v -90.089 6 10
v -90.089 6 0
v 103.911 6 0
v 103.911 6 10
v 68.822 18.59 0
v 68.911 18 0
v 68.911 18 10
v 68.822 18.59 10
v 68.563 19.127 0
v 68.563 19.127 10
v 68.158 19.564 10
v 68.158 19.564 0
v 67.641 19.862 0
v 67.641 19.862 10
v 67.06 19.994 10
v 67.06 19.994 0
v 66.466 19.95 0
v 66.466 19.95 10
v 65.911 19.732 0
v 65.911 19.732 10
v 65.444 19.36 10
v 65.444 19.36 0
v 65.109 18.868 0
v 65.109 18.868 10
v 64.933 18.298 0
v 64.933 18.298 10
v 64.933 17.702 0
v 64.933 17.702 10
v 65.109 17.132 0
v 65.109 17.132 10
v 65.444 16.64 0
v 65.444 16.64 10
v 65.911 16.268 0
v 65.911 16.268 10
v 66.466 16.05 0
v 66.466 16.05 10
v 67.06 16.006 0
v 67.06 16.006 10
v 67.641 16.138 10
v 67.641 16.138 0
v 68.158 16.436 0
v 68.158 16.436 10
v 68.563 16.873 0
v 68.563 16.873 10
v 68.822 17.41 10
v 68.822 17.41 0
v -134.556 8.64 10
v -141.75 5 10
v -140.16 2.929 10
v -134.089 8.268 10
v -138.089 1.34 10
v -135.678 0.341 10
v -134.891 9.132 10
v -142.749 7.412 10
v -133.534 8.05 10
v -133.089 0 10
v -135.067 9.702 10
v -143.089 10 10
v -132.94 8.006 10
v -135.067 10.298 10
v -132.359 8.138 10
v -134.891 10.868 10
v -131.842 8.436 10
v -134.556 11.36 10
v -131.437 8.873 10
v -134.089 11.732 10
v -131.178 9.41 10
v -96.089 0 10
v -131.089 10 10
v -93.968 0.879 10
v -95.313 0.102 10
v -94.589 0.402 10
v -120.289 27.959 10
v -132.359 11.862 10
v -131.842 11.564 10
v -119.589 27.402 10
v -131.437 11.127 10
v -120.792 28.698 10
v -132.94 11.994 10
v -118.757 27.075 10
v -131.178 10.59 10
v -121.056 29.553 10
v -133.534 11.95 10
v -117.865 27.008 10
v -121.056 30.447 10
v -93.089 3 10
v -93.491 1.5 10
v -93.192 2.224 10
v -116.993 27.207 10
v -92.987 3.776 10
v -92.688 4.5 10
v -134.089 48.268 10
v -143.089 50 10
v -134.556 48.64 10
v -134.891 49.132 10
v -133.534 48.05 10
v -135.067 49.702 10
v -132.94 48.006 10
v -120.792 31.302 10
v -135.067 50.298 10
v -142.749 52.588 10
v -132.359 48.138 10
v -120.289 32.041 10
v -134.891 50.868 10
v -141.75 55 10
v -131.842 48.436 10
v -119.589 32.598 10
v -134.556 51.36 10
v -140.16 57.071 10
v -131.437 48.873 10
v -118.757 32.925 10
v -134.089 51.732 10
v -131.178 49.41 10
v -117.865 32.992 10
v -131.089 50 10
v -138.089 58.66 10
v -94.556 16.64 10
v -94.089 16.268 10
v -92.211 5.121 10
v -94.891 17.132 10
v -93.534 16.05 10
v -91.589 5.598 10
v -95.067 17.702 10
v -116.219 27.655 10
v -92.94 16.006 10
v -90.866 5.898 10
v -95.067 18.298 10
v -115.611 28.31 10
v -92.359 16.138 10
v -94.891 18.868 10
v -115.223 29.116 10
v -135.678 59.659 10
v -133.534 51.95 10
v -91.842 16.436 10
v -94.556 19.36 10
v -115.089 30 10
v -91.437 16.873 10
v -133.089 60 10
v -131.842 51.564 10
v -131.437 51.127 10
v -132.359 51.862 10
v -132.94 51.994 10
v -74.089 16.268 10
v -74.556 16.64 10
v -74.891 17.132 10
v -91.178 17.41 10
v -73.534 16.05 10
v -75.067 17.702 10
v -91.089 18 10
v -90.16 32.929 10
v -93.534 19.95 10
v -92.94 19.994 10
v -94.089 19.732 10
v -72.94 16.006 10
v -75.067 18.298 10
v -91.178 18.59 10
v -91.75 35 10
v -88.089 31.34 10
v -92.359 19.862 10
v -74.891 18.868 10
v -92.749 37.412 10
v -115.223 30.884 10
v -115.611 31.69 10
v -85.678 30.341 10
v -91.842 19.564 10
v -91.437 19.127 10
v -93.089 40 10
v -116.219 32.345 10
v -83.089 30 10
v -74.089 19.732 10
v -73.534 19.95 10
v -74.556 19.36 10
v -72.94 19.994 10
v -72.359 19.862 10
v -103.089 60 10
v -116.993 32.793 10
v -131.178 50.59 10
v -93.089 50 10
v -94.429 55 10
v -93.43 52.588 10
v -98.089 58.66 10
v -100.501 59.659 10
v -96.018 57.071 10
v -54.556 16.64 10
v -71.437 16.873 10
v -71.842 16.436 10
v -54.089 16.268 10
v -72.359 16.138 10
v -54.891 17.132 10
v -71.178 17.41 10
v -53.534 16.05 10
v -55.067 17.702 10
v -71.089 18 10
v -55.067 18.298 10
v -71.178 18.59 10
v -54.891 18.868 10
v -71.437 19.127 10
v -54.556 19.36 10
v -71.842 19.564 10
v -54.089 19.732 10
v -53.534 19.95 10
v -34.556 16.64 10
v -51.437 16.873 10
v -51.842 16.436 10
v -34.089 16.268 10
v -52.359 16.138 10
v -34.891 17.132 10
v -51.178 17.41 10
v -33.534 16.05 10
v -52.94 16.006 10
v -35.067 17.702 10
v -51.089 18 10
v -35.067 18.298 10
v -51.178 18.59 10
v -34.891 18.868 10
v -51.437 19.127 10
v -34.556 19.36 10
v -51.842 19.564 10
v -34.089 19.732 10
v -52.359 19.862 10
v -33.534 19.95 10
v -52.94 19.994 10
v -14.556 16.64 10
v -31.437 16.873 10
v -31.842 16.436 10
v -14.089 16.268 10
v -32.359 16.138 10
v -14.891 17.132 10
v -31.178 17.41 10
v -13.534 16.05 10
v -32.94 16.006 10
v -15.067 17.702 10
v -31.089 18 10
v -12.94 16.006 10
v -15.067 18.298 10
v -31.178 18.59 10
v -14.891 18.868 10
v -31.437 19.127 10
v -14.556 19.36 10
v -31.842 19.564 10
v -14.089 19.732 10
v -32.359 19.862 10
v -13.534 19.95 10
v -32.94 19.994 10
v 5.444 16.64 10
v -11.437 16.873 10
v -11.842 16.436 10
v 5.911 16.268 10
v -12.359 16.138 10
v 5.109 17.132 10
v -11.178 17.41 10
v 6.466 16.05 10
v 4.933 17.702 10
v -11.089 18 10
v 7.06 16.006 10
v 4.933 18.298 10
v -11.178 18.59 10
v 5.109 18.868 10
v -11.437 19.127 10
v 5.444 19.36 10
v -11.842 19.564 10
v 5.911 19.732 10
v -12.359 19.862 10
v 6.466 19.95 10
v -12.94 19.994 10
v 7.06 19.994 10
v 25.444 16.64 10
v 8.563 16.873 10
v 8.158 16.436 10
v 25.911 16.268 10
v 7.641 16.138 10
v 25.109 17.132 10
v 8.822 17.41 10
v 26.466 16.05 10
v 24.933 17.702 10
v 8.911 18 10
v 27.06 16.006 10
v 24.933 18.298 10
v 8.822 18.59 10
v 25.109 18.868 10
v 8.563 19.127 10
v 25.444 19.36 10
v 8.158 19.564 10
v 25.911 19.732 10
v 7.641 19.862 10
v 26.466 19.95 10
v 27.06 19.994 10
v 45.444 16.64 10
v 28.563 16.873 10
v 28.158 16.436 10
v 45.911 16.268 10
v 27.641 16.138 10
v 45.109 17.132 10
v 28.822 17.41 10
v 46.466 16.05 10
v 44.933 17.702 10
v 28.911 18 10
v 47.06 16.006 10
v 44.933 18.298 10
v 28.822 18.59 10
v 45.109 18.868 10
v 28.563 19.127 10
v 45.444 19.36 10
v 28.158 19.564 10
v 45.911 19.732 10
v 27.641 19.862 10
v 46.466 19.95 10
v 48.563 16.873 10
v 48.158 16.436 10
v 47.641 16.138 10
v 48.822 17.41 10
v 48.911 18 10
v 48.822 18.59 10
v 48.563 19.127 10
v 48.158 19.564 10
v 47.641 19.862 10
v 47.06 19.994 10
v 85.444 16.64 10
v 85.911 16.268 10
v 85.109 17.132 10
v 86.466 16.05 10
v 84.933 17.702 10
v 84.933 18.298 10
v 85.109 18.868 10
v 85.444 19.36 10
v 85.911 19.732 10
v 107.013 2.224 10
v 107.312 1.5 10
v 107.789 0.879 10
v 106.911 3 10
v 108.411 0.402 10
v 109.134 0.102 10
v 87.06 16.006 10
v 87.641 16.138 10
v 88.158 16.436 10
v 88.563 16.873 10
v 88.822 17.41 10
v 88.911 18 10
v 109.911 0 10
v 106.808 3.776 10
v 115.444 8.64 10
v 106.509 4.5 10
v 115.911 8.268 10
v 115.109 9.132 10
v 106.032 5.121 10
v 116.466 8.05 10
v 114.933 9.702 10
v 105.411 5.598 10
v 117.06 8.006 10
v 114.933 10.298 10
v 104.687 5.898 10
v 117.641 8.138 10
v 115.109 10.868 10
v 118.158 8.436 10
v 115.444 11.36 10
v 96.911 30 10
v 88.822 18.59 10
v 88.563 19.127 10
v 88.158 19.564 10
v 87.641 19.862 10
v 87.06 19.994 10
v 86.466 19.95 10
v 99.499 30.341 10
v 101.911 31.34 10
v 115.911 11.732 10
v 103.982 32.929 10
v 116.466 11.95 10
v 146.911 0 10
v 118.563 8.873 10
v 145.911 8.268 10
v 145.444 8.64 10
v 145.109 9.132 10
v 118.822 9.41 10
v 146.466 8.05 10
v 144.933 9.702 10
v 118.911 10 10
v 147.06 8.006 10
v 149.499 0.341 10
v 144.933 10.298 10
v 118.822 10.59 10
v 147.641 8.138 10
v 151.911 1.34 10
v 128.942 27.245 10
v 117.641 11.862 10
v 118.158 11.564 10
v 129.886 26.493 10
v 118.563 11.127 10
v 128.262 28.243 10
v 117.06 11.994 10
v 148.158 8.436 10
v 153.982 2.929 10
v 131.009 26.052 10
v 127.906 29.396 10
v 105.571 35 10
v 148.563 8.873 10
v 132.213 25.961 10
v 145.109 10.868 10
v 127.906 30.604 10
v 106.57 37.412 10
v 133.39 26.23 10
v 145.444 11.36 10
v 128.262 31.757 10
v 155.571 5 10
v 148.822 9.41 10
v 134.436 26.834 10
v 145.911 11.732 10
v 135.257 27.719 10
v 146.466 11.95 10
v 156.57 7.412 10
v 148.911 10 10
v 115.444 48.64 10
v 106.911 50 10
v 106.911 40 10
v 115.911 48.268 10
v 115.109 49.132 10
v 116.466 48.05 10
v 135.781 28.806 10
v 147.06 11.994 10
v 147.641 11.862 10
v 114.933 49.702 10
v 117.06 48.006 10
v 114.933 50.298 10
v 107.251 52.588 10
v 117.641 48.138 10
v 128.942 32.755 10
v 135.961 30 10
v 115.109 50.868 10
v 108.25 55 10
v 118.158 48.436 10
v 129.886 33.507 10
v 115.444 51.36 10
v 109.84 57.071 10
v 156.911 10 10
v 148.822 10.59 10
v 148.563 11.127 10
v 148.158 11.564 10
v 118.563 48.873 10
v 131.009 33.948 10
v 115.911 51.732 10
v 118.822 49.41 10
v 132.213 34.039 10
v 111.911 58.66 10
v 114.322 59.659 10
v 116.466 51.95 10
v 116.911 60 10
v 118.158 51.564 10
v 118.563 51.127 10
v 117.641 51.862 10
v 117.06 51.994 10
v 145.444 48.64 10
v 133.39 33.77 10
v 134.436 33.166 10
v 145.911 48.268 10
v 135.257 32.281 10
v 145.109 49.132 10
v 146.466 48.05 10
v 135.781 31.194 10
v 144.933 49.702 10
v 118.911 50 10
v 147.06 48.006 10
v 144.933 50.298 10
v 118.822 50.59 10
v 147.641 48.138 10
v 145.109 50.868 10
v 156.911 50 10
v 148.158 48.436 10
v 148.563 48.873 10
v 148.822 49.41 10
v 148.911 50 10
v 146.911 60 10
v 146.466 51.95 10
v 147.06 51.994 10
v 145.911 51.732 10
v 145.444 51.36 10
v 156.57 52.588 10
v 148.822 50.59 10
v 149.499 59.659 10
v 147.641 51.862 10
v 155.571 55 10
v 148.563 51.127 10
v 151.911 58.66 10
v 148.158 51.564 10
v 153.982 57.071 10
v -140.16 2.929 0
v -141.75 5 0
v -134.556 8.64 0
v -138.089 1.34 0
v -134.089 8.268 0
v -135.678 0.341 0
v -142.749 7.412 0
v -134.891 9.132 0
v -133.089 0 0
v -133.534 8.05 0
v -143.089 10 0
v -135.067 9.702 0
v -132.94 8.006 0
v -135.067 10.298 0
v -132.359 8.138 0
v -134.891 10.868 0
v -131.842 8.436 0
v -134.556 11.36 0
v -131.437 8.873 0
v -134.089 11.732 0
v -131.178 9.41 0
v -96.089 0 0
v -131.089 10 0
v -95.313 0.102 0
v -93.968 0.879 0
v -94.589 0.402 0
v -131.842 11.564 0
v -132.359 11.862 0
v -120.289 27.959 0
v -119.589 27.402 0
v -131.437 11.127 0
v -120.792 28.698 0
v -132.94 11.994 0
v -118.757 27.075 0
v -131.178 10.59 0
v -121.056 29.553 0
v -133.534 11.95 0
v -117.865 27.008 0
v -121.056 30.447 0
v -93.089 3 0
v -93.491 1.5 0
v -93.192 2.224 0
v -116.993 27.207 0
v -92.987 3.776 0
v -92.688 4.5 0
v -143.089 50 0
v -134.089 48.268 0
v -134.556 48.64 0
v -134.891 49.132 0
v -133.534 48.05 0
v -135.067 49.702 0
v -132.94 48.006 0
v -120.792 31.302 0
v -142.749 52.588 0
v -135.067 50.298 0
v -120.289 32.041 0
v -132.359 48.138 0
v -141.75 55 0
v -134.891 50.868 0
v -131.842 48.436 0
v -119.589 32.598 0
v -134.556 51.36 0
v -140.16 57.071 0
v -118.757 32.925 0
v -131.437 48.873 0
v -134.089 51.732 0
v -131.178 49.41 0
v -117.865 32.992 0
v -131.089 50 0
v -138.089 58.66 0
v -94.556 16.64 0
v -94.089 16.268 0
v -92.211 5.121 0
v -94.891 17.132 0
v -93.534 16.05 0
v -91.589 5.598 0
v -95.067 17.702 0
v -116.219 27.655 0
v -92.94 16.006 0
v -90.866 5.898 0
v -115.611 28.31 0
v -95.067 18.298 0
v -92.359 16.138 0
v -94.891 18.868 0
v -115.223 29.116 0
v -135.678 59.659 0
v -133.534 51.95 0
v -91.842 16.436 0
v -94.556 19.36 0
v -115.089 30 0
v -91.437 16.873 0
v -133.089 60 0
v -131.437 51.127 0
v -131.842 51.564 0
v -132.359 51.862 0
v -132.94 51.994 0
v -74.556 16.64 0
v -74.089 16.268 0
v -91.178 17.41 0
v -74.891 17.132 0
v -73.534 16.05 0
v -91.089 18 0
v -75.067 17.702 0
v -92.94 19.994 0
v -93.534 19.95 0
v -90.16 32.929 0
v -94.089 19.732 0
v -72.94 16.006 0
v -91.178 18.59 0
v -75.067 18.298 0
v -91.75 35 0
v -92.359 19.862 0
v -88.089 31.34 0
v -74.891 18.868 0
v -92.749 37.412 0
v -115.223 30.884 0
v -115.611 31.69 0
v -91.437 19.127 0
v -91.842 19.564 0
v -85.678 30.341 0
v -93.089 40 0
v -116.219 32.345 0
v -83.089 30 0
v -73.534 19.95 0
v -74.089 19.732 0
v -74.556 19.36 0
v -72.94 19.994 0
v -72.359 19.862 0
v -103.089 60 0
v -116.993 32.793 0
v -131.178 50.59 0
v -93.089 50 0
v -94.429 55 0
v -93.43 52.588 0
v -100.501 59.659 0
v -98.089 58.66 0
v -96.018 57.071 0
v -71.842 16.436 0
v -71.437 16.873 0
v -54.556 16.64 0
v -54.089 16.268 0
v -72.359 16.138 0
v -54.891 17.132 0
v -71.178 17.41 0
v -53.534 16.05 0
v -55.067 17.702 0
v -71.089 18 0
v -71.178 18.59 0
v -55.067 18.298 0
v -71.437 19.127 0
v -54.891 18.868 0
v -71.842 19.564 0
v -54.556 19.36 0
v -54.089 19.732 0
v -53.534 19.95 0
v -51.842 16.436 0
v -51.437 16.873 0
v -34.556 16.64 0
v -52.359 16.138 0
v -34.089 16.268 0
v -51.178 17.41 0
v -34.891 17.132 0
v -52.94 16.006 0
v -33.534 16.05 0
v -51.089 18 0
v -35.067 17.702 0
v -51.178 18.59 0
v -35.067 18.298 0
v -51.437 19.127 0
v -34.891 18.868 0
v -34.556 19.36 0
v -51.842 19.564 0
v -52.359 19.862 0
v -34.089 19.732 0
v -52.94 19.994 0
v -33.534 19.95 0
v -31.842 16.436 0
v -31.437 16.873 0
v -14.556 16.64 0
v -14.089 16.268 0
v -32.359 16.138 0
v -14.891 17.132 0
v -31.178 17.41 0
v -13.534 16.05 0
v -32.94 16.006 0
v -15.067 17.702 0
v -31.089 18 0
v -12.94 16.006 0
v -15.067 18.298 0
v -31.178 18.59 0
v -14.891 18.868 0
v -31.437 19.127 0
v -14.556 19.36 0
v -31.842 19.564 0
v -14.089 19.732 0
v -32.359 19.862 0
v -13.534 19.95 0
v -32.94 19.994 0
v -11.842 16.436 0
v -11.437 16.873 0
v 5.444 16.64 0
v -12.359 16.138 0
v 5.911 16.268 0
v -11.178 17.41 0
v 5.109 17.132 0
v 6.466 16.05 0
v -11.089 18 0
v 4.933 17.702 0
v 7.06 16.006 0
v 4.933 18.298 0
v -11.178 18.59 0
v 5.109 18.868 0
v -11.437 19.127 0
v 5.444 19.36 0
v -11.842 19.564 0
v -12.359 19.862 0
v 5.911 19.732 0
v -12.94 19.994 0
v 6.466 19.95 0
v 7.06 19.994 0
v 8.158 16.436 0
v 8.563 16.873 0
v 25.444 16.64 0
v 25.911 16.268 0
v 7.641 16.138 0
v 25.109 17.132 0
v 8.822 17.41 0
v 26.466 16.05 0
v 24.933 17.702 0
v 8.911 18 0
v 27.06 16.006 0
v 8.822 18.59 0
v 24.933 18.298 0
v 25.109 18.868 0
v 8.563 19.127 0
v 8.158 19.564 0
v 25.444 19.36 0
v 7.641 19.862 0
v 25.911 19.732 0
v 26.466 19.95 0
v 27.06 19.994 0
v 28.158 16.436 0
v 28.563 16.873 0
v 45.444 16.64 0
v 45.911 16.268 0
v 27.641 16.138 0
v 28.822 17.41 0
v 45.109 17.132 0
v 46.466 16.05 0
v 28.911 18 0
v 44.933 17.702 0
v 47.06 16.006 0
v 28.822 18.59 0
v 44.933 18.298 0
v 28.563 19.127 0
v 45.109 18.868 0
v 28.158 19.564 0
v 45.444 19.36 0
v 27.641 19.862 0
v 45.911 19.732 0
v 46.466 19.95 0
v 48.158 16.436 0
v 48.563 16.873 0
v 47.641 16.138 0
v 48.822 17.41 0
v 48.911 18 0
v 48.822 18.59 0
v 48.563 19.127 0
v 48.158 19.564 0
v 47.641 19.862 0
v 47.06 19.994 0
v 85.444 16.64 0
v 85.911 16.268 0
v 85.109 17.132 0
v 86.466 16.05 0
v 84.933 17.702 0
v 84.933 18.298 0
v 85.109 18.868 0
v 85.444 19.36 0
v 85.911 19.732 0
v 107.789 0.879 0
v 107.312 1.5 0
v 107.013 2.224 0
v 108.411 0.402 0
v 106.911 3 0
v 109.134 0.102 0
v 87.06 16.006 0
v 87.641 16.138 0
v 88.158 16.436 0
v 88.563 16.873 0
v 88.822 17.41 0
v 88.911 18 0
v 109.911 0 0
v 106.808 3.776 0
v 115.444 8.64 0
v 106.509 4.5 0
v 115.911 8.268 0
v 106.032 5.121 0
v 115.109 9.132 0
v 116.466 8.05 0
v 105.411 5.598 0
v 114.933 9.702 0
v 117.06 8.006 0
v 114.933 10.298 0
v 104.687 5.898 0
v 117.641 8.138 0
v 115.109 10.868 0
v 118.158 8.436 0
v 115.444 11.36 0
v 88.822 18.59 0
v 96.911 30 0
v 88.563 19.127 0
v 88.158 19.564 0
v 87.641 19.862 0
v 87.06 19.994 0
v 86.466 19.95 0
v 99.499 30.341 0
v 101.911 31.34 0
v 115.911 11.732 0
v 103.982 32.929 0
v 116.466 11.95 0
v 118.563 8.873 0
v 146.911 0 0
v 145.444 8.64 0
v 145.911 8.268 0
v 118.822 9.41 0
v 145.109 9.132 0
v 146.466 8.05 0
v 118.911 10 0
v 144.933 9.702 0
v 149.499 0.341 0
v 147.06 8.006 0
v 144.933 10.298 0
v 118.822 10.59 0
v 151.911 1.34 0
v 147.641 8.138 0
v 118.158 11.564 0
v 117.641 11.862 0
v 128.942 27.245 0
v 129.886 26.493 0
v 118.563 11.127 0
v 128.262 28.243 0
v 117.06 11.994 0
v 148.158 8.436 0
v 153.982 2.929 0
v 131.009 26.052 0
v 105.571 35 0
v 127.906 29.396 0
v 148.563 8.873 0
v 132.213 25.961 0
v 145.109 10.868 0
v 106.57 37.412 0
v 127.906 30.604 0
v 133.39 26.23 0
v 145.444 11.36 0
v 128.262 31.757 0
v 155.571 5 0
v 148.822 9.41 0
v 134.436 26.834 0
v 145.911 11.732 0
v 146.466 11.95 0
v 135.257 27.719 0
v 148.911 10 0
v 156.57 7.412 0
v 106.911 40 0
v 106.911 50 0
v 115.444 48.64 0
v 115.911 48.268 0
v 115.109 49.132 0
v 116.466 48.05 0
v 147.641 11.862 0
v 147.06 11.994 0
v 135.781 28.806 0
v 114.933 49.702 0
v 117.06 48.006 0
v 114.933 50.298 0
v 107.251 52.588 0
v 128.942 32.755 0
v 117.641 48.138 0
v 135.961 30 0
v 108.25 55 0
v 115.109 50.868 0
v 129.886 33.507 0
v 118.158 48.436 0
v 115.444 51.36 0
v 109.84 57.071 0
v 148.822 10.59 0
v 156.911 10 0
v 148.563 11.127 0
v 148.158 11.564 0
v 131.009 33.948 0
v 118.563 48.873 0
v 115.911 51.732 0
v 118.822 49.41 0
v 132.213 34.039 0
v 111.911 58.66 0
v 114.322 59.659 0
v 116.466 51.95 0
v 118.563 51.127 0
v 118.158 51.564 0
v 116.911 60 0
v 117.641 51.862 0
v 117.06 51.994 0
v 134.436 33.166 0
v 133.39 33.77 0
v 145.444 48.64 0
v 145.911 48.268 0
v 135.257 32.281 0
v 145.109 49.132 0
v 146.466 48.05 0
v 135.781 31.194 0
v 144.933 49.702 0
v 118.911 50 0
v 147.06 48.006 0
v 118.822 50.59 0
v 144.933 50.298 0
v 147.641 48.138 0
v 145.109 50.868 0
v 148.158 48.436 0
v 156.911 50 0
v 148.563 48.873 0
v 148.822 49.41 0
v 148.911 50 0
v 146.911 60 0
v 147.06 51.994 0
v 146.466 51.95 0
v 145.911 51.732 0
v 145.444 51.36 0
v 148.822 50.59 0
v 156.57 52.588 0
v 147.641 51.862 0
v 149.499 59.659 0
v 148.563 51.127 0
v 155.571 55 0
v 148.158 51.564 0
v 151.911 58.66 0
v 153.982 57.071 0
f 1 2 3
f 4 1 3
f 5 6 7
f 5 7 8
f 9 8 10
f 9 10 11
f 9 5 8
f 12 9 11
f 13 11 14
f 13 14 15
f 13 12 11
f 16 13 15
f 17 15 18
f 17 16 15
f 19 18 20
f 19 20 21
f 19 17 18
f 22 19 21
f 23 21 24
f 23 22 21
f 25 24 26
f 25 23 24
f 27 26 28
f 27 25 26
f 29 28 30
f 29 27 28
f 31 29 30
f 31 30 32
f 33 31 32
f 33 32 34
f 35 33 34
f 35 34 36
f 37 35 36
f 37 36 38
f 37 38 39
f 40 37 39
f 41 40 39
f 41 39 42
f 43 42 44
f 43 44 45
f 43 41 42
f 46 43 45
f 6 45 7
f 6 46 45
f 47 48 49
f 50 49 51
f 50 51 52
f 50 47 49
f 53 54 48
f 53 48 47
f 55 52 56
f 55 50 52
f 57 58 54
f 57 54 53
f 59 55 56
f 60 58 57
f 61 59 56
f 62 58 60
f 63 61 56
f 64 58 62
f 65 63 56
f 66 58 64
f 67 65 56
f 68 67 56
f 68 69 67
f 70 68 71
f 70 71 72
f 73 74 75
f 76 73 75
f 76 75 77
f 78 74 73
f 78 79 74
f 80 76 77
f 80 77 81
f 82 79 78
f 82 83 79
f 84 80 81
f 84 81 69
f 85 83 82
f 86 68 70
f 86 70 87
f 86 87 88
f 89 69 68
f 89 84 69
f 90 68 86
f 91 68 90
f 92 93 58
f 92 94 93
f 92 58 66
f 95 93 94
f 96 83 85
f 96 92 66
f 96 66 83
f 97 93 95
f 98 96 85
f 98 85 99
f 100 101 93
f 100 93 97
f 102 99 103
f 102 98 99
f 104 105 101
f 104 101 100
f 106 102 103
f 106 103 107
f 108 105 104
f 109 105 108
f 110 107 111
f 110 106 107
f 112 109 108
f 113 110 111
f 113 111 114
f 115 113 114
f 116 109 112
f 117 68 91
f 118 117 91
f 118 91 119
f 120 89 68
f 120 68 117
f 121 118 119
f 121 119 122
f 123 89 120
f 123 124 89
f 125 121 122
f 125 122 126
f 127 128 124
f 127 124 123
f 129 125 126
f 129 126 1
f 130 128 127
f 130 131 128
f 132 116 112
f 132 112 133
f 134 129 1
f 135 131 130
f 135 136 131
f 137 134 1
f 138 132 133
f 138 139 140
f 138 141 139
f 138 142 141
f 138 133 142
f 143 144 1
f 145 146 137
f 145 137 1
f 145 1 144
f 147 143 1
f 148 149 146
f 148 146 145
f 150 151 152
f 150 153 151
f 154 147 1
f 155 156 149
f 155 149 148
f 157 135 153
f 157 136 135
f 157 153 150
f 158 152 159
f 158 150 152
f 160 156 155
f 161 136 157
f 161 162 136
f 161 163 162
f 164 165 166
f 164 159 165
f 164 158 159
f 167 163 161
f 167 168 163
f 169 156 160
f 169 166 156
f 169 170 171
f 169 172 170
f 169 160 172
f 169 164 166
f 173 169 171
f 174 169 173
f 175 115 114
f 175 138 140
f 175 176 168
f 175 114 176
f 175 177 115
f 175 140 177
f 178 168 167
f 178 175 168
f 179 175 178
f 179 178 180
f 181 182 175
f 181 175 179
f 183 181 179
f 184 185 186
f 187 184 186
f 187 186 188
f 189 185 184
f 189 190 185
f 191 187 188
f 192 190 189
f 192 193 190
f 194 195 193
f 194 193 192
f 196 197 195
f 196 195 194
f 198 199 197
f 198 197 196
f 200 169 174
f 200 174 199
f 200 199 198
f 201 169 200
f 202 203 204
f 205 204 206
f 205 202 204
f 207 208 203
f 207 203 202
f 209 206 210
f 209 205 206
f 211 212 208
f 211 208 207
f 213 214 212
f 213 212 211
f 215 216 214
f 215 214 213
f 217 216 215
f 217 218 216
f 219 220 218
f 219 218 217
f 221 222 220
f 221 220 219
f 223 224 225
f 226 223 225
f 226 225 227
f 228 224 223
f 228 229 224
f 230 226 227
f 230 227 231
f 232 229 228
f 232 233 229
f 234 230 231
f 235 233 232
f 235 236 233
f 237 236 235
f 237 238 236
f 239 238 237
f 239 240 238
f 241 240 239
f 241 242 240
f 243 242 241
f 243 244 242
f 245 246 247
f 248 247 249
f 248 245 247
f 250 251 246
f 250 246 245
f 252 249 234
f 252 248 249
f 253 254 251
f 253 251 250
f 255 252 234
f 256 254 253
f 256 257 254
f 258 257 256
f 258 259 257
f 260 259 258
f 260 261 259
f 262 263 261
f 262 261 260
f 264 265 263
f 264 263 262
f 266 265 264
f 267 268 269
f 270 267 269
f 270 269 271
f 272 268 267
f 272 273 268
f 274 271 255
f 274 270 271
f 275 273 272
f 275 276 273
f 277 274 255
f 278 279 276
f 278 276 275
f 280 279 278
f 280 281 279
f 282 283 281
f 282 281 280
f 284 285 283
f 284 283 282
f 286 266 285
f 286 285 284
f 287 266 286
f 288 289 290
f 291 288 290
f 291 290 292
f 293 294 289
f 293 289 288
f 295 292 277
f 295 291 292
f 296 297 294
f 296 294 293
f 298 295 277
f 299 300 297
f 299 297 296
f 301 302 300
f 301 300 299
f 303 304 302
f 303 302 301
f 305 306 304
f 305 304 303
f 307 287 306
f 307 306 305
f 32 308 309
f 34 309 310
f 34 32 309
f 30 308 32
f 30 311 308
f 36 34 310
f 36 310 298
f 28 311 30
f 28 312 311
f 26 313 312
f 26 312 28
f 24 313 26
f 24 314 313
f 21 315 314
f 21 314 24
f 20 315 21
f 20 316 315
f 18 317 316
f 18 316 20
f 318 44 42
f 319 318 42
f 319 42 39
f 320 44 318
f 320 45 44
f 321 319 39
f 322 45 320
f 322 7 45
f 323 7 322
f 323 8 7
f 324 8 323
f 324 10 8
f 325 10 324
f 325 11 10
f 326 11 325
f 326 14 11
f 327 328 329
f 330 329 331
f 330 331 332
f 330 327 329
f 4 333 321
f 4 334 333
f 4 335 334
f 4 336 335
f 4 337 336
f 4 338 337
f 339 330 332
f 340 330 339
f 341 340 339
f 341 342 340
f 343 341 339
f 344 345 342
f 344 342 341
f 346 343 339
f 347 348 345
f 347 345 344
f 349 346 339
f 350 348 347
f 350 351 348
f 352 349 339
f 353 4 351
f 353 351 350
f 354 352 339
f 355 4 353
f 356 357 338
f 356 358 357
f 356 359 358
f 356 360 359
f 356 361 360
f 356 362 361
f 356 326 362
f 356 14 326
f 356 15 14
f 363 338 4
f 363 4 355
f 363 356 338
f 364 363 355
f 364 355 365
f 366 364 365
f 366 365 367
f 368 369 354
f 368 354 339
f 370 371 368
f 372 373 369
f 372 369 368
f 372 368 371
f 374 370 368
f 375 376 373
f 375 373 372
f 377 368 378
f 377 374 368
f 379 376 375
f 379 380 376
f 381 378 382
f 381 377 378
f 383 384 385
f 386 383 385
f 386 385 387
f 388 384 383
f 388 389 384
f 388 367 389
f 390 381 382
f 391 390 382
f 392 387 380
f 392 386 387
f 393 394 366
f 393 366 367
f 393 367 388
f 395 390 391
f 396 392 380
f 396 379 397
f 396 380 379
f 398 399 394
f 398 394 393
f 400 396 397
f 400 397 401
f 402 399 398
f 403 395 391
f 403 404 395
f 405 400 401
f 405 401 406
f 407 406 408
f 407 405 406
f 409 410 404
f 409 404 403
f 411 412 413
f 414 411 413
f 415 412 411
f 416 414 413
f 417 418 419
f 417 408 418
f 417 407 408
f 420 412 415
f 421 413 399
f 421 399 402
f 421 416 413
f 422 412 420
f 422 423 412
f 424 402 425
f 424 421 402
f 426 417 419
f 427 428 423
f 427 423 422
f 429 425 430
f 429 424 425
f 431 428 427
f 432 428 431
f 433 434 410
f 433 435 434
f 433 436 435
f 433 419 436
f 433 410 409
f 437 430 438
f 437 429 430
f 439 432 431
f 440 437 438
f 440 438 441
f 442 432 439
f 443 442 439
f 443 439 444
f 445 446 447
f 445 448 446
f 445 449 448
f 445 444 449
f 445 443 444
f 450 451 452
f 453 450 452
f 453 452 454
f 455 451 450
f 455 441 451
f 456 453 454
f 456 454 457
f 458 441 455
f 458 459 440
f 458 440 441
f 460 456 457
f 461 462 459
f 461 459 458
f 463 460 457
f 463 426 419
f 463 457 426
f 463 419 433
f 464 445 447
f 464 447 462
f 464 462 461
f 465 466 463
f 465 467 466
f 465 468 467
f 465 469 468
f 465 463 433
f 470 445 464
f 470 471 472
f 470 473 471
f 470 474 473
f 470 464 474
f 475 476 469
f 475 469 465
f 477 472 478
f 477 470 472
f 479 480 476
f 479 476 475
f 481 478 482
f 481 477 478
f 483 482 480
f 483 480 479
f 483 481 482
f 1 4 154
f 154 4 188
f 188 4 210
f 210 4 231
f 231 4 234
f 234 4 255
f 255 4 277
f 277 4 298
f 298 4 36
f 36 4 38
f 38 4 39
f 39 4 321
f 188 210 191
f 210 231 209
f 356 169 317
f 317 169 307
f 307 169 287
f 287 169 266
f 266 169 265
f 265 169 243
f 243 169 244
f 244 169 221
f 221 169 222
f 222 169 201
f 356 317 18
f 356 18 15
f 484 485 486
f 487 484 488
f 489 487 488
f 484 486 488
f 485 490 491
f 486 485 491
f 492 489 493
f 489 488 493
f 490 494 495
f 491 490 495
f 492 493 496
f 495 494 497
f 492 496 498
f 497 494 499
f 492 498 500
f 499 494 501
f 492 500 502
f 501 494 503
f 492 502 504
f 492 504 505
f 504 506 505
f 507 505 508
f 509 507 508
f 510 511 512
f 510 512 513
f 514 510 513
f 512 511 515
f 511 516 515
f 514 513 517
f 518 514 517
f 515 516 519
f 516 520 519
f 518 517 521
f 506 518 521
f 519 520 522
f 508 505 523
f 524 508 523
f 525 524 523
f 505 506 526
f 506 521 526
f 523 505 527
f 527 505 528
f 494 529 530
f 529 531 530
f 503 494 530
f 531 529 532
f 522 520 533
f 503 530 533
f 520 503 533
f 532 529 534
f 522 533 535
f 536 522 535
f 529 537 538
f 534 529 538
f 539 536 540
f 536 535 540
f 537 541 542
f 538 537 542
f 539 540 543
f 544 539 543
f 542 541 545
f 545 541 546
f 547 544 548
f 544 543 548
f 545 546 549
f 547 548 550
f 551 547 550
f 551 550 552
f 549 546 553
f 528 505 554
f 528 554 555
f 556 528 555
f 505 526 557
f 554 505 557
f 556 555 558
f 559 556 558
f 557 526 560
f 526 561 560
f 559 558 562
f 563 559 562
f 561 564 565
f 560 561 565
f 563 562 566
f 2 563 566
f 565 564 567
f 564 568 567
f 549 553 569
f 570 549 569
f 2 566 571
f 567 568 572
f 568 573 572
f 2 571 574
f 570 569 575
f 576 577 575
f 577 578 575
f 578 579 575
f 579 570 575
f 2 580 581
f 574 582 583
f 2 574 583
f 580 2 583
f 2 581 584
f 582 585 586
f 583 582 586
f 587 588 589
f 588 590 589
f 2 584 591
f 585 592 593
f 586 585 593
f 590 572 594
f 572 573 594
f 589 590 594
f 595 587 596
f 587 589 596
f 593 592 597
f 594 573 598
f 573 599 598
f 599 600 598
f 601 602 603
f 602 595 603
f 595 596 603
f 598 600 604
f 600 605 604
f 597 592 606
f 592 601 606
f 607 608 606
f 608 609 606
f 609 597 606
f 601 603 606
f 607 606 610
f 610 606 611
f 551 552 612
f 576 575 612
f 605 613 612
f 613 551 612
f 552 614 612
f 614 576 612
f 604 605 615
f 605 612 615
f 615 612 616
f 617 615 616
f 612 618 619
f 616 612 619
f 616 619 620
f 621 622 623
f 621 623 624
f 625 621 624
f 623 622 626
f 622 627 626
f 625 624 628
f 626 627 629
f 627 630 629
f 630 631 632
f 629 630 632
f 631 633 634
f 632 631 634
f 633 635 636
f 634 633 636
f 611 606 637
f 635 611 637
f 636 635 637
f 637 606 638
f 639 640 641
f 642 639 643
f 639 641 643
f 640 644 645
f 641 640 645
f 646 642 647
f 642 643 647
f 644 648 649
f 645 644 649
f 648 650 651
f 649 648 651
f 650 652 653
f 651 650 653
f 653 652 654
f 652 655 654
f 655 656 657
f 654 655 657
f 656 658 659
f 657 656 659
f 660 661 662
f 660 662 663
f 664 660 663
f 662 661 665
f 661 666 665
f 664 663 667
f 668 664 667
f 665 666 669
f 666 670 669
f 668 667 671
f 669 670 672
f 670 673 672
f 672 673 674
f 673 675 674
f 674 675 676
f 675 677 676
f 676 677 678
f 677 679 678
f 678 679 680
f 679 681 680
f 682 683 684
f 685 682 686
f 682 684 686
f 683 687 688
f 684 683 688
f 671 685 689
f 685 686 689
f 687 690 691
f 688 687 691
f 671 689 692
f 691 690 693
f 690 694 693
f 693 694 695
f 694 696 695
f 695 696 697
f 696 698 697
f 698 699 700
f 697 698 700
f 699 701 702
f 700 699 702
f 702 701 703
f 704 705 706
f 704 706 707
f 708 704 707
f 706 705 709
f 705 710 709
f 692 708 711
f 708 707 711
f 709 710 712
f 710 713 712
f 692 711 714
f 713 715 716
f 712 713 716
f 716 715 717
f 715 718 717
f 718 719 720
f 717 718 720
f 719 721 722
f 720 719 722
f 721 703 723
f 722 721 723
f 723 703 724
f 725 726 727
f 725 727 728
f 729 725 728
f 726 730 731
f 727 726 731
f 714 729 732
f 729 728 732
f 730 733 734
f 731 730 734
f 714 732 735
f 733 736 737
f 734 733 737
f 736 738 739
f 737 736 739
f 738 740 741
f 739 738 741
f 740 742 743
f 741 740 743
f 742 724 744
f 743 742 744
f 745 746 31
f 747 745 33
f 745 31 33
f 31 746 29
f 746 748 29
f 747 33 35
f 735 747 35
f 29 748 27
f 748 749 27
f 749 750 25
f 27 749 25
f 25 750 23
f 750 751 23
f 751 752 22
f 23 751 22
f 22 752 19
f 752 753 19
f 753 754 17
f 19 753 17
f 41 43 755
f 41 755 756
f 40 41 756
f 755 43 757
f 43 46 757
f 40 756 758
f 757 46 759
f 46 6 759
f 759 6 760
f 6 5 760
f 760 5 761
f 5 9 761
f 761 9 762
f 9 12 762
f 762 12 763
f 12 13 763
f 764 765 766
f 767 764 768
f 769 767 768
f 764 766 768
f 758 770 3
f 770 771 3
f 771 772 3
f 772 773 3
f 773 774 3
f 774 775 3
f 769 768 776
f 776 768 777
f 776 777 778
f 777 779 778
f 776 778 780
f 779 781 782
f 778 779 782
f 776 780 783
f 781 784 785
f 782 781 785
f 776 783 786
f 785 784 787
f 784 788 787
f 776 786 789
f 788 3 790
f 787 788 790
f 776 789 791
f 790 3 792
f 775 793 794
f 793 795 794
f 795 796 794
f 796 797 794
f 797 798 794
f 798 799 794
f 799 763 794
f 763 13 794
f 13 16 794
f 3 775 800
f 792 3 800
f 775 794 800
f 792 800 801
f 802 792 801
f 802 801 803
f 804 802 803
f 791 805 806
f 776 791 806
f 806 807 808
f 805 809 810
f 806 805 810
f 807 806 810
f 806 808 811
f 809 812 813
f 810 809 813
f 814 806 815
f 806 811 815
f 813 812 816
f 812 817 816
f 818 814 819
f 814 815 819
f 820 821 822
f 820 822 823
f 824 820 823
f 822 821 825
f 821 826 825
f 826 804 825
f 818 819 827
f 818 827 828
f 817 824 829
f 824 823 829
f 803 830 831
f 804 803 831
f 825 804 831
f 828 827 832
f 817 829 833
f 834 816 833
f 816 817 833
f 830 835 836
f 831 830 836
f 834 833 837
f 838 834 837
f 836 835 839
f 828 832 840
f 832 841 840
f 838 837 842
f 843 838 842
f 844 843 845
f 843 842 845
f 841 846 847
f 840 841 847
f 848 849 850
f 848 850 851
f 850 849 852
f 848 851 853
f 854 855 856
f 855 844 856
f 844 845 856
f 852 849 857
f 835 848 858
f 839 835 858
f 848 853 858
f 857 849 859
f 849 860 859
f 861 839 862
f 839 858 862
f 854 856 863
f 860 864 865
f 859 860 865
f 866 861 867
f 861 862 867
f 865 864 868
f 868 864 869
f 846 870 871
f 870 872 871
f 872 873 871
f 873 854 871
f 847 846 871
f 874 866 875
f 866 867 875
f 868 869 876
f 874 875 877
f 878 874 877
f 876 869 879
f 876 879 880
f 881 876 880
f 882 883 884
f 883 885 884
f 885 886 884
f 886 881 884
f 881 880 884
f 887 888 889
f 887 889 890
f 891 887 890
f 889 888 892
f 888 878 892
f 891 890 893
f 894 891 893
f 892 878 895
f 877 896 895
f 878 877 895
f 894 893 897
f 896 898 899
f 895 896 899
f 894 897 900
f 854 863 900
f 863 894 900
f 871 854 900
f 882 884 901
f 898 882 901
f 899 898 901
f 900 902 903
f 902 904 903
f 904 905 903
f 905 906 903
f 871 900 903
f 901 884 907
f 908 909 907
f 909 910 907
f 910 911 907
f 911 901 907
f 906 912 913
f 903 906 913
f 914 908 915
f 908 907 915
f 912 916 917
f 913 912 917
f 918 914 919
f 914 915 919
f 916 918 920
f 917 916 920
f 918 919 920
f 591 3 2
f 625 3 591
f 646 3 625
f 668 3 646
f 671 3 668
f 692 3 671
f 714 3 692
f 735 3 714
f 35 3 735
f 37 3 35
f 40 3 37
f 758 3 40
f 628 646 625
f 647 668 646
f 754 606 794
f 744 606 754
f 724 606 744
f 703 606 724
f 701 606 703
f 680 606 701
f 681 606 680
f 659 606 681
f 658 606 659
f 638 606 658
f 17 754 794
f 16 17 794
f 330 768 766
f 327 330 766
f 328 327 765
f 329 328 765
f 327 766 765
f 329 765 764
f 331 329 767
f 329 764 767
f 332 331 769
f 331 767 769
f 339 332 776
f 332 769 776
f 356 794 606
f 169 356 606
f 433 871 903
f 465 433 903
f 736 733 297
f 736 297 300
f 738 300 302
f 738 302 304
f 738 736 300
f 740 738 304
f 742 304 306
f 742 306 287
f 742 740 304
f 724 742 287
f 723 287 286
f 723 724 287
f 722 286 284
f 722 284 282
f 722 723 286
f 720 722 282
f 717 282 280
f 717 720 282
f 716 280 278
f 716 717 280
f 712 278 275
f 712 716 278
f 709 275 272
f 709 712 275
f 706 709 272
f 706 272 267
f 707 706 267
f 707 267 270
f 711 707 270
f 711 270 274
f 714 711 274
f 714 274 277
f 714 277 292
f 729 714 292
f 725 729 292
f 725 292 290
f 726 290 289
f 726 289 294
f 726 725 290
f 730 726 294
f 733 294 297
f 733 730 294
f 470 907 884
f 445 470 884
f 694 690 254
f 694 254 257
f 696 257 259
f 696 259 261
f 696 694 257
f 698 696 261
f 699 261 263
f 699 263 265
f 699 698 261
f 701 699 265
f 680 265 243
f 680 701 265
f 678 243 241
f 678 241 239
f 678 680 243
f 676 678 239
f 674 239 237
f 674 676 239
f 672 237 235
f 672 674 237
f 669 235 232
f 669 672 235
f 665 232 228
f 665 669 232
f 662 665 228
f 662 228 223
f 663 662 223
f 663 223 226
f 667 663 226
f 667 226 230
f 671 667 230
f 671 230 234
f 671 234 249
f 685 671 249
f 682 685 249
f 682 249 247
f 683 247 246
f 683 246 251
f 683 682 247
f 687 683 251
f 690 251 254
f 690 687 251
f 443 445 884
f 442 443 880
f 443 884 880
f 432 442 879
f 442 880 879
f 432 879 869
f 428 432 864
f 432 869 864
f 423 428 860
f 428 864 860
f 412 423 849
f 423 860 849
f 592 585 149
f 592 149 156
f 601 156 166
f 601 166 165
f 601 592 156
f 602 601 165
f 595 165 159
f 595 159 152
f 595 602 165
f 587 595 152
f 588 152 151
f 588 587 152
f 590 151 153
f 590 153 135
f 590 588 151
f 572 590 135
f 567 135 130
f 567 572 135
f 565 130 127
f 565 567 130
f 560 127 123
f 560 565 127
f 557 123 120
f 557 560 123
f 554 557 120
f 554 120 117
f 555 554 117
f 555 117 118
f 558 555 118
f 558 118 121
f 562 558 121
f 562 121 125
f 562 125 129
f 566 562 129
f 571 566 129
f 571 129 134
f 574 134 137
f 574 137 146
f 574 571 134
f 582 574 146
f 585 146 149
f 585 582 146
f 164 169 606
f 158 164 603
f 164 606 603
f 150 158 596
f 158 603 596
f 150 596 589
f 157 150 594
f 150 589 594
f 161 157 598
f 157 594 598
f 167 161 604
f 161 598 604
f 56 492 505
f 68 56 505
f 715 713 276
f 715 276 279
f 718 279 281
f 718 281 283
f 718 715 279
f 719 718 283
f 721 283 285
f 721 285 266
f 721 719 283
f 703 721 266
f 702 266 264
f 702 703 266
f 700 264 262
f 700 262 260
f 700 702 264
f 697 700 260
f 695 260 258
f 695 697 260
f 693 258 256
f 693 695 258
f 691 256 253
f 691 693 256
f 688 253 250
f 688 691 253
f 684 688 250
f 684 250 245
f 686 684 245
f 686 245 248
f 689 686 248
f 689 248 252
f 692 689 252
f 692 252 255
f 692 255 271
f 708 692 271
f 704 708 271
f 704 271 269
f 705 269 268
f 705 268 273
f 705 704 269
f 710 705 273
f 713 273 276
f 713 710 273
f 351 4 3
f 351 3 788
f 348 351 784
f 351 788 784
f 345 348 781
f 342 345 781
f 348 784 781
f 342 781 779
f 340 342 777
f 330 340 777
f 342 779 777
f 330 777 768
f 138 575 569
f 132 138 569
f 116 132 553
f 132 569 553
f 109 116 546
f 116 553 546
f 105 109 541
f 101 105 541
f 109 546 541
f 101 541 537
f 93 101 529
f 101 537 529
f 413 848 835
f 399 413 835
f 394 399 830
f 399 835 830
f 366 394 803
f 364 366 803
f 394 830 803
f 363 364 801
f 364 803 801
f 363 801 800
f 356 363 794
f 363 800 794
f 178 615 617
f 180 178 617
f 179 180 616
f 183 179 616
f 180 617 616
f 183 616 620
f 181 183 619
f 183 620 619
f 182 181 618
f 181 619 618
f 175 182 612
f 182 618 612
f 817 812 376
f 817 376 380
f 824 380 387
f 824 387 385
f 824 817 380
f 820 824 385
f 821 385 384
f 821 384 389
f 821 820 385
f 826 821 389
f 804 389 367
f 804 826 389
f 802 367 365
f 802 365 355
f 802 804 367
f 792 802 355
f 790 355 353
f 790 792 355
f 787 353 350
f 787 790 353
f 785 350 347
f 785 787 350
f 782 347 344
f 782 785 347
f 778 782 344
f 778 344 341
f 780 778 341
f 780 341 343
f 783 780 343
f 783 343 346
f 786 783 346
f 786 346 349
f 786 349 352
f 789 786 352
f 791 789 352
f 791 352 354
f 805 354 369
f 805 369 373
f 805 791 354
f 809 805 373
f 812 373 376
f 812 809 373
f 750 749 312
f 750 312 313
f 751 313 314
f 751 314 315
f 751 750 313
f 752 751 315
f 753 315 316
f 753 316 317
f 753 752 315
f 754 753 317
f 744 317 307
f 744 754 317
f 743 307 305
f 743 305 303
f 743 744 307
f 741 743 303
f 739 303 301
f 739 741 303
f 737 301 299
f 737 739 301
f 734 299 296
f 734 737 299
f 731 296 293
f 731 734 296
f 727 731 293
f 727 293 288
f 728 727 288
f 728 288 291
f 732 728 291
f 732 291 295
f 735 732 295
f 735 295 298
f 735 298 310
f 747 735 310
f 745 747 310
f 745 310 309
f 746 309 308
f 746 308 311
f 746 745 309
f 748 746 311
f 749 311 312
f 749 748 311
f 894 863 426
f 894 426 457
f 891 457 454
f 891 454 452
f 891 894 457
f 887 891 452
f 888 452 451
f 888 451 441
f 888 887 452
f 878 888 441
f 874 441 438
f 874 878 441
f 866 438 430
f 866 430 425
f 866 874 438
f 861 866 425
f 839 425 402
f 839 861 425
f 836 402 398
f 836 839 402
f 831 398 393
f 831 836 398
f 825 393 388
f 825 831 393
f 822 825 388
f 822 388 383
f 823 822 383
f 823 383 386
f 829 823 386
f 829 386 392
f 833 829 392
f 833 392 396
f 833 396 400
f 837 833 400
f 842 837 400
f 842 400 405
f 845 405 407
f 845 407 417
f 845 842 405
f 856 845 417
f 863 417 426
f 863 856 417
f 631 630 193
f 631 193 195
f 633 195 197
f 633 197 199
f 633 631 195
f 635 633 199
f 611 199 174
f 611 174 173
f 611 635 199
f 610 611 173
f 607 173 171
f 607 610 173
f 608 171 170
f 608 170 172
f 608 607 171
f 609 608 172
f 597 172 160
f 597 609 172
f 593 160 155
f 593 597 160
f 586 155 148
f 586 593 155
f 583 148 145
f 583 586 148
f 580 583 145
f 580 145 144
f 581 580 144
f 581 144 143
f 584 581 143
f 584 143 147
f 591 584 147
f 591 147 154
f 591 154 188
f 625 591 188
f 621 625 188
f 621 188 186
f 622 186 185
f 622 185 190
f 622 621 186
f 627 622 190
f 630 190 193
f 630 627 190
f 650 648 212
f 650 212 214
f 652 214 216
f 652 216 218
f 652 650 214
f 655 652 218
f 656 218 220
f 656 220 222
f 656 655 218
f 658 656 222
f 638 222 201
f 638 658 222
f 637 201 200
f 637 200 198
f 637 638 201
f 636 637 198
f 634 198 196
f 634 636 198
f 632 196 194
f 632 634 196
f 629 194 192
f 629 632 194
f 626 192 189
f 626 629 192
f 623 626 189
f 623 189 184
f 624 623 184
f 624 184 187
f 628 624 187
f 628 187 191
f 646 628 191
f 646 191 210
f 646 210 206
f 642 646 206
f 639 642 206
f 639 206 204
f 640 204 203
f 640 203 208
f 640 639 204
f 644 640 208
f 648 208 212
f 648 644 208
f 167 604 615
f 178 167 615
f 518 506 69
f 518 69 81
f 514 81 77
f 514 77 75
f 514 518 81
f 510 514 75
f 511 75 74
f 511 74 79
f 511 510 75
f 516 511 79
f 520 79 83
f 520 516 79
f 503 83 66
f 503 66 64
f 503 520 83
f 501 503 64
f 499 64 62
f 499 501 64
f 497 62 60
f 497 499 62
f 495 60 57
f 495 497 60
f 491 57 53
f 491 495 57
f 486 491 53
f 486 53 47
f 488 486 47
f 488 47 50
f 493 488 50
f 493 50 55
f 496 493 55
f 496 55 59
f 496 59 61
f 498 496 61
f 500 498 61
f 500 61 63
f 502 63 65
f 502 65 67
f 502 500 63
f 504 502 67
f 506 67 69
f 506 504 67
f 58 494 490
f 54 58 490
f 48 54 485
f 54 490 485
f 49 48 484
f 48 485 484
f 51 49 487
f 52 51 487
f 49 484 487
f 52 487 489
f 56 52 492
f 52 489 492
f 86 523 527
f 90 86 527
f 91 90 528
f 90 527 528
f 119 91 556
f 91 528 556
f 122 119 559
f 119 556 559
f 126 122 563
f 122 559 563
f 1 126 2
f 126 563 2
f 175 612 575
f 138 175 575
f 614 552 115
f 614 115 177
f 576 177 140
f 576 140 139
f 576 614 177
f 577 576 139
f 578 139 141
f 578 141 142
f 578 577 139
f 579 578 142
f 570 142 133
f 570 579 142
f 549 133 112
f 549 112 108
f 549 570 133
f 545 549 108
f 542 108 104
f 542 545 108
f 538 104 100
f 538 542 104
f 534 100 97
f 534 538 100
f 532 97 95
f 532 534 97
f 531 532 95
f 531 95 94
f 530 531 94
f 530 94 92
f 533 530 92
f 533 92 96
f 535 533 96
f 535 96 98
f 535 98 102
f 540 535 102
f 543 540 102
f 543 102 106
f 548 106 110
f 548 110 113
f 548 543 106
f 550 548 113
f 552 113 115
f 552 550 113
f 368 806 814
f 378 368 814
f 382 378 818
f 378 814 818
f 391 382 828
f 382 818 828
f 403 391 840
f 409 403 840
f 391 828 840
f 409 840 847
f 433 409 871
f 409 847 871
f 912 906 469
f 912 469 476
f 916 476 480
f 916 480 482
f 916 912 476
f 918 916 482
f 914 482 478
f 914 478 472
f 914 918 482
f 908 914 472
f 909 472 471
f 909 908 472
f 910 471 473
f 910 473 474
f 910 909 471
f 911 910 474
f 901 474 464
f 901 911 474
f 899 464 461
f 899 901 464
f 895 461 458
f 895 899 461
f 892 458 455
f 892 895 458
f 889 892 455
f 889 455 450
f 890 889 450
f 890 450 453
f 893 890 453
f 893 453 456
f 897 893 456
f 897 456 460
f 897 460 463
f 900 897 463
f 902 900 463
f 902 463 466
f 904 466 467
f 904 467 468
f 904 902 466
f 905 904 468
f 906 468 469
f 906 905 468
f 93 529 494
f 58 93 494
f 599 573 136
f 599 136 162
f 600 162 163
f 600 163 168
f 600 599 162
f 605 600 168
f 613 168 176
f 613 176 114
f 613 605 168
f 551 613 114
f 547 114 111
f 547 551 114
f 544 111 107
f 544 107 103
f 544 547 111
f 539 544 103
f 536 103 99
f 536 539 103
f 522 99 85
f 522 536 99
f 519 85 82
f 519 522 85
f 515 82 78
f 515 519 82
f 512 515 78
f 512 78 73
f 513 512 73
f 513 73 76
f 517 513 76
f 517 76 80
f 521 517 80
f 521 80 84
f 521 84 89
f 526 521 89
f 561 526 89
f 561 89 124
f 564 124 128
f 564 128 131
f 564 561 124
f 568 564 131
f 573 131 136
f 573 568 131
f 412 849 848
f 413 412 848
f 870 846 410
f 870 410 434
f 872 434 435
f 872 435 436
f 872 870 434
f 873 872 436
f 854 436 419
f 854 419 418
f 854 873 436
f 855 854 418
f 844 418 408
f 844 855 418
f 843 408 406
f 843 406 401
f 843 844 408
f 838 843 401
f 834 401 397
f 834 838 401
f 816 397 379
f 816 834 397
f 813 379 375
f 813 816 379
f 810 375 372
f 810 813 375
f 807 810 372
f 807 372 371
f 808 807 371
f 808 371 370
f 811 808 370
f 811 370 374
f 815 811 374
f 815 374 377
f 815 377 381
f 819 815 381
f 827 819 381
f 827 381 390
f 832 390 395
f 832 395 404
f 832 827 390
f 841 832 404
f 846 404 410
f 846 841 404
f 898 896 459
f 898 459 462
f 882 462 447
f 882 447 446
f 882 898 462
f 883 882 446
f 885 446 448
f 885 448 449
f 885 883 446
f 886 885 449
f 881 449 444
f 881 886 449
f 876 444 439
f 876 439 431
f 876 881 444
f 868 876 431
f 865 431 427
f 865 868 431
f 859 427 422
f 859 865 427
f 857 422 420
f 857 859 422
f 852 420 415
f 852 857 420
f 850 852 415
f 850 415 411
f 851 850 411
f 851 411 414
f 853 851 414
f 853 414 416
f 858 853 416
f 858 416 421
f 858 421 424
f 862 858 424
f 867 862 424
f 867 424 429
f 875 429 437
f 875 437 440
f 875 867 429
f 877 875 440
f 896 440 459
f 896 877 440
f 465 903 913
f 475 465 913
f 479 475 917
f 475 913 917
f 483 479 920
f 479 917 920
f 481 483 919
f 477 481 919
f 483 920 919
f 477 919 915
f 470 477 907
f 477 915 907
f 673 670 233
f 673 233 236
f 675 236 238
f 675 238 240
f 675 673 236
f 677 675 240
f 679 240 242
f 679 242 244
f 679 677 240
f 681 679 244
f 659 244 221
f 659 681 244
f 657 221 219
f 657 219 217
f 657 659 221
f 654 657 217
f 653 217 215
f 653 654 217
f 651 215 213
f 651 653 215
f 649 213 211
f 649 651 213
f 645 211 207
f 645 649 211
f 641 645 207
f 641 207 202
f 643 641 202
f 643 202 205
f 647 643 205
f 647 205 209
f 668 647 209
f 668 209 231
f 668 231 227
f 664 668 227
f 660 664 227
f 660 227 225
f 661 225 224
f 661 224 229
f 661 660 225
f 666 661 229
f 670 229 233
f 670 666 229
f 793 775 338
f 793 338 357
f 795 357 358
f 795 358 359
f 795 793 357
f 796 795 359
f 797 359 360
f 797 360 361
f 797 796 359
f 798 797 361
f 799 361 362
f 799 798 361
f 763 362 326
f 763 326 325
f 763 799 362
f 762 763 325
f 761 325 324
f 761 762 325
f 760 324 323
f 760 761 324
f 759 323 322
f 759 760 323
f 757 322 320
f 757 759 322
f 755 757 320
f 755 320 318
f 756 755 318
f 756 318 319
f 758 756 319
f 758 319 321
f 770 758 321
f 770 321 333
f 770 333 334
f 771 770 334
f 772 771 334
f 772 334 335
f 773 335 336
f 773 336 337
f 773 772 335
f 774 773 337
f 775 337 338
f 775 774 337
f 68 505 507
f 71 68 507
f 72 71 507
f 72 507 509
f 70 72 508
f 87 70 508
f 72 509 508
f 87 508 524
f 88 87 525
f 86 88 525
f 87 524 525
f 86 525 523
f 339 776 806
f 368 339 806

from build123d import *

# Parameters (mm, degrees)
MODEL_R             = 4.05
MODEL_R_2           = 3
MODEL_R_3           = 2
BOSS_EXTRUDE1_DEPTH = 10


with BuildPart() as part:
    # Model → Boss-Extrude1 (new body)
    with BuildSketch(Plane.XY):
        with BuildLine():
            Line((-90.089430894, 6), (103.910569106, 6))
            ThreePointArc((103.910569106, 6), (106.031889449, 5.121320344), (106.910569106, 3))
            ThreePointArc((106.910569106, 3), (107.789248762, 0.878679656), (109.910569106, 0))
            Line((109.910569106, 0), (146.910569106, 0))
            ThreePointArc((146.910569106, 0), (153.981636918, 2.928932188), (156.910569106, 10))
            Line((156.910569106, 10), (156.910569106, 50))
            ThreePointArc((156.910569106, 50), (153.981636918, 57.071067812), (146.910569106, 60))
            Line((146.910569106, 60), (116.910569106, 60))
            ThreePointArc((116.910569106, 60), (109.839501294, 57.071067812), (106.910569106, 50))
            Line((106.910569106, 50), (106.910569106, 40))
            ThreePointArc((106.910569106, 40), (103.981636918, 32.928932188), (96.910569106, 30))
            Line((96.910569106, 30), (-83.089430894, 30))
            ThreePointArc((-83.089430894, 30), (-90.160498706, 32.928932188), (-93.089430894, 40))
            Line((-93.089430894, 40), (-93.089430894, 50))
            ThreePointArc((-93.089430894, 50), (-96.018363082, 57.071067812), (-103.089430894, 60))
            Line((-103.089430894, 60), (-133.089430894, 60))
            ThreePointArc((-133.089430894, 60), (-140.160498706, 57.071067812), (-143.089430894, 50))
            Line((-143.089430894, 50), (-143.089430894, 10))
            ThreePointArc((-143.089430894, 10), (-140.160498706, 2.928932188), (-133.089430894, 0))
            Line((-133.089430894, 0), (-96.089430894, 0))
            ThreePointArc((-96.089430894, 0), (-93.968110551, 0.878679656), (-93.089430894, 3))
            ThreePointArc((-93.089430894, 3), (-92.210751238, 5.121320344), (-90.089430894, 6))
        make_face()
        with Locations((131.910569106, 30)):
            Circle(MODEL_R, mode=Mode.SUBTRACT)
        with Locations((-118.089430894, 30)):
            Circle(MODEL_R_2, mode=Mode.SUBTRACT)
        with Locations((6.910569106, 18)):
            Circle(MODEL_R_3, mode=Mode.SUBTRACT)
        with Locations((-33.089430894, 18)):
            Circle(MODEL_R_3, mode=Mode.SUBTRACT)
        with Locations((-13.089430894, 18)):
            Circle(MODEL_R_3, mode=Mode.SUBTRACT)
        with Locations((86.910569106, 18)):
            Circle(MODEL_R_3, mode=Mode.SUBTRACT)
        with Locations((66.910569106, 18)):
            Circle(MODEL_R_3, mode=Mode.SUBTRACT)
        with Locations((46.910569106, 18)):
            Circle(MODEL_R_3, mode=Mode.SUBTRACT)
        with Locations((26.910569106, 18)):
            Circle(MODEL_R_3, mode=Mode.SUBTRACT)
        with Locations((146.910569106, 10)):
            Circle(MODEL_R_3, mode=Mode.SUBTRACT)
        with Locations((146.910569106, 50)):
            Circle(MODEL_R_3, mode=Mode.SUBTRACT)
        with Locations((-133.089430894, 10)):
            Circle(MODEL_R_3, mode=Mode.SUBTRACT)
        with Locations((-133.089430894, 50)):
            Circle(MODEL_R_3, mode=Mode.SUBTRACT)
        with Locations((-93.089430894, 18)):
            Circle(MODEL_R_3, mode=Mode.SUBTRACT)
        with Locations((-73.089430894, 18)):
            Circle(MODEL_R_3, mode=Mode.SUBTRACT)
        with Locations((-53.089430894, 18)):
            Circle(MODEL_R_3, mode=Mode.SUBTRACT)
        with Locations((116.910569106, 50)):
            Circle(MODEL_R_3, mode=Mode.SUBTRACT)
        with Locations((116.910569106, 10)):
            Circle(MODEL_R_3, mode=Mode.SUBTRACT)
    extrude(amount=BOSS_EXTRUDE1_DEPTH)


solid = part.part
